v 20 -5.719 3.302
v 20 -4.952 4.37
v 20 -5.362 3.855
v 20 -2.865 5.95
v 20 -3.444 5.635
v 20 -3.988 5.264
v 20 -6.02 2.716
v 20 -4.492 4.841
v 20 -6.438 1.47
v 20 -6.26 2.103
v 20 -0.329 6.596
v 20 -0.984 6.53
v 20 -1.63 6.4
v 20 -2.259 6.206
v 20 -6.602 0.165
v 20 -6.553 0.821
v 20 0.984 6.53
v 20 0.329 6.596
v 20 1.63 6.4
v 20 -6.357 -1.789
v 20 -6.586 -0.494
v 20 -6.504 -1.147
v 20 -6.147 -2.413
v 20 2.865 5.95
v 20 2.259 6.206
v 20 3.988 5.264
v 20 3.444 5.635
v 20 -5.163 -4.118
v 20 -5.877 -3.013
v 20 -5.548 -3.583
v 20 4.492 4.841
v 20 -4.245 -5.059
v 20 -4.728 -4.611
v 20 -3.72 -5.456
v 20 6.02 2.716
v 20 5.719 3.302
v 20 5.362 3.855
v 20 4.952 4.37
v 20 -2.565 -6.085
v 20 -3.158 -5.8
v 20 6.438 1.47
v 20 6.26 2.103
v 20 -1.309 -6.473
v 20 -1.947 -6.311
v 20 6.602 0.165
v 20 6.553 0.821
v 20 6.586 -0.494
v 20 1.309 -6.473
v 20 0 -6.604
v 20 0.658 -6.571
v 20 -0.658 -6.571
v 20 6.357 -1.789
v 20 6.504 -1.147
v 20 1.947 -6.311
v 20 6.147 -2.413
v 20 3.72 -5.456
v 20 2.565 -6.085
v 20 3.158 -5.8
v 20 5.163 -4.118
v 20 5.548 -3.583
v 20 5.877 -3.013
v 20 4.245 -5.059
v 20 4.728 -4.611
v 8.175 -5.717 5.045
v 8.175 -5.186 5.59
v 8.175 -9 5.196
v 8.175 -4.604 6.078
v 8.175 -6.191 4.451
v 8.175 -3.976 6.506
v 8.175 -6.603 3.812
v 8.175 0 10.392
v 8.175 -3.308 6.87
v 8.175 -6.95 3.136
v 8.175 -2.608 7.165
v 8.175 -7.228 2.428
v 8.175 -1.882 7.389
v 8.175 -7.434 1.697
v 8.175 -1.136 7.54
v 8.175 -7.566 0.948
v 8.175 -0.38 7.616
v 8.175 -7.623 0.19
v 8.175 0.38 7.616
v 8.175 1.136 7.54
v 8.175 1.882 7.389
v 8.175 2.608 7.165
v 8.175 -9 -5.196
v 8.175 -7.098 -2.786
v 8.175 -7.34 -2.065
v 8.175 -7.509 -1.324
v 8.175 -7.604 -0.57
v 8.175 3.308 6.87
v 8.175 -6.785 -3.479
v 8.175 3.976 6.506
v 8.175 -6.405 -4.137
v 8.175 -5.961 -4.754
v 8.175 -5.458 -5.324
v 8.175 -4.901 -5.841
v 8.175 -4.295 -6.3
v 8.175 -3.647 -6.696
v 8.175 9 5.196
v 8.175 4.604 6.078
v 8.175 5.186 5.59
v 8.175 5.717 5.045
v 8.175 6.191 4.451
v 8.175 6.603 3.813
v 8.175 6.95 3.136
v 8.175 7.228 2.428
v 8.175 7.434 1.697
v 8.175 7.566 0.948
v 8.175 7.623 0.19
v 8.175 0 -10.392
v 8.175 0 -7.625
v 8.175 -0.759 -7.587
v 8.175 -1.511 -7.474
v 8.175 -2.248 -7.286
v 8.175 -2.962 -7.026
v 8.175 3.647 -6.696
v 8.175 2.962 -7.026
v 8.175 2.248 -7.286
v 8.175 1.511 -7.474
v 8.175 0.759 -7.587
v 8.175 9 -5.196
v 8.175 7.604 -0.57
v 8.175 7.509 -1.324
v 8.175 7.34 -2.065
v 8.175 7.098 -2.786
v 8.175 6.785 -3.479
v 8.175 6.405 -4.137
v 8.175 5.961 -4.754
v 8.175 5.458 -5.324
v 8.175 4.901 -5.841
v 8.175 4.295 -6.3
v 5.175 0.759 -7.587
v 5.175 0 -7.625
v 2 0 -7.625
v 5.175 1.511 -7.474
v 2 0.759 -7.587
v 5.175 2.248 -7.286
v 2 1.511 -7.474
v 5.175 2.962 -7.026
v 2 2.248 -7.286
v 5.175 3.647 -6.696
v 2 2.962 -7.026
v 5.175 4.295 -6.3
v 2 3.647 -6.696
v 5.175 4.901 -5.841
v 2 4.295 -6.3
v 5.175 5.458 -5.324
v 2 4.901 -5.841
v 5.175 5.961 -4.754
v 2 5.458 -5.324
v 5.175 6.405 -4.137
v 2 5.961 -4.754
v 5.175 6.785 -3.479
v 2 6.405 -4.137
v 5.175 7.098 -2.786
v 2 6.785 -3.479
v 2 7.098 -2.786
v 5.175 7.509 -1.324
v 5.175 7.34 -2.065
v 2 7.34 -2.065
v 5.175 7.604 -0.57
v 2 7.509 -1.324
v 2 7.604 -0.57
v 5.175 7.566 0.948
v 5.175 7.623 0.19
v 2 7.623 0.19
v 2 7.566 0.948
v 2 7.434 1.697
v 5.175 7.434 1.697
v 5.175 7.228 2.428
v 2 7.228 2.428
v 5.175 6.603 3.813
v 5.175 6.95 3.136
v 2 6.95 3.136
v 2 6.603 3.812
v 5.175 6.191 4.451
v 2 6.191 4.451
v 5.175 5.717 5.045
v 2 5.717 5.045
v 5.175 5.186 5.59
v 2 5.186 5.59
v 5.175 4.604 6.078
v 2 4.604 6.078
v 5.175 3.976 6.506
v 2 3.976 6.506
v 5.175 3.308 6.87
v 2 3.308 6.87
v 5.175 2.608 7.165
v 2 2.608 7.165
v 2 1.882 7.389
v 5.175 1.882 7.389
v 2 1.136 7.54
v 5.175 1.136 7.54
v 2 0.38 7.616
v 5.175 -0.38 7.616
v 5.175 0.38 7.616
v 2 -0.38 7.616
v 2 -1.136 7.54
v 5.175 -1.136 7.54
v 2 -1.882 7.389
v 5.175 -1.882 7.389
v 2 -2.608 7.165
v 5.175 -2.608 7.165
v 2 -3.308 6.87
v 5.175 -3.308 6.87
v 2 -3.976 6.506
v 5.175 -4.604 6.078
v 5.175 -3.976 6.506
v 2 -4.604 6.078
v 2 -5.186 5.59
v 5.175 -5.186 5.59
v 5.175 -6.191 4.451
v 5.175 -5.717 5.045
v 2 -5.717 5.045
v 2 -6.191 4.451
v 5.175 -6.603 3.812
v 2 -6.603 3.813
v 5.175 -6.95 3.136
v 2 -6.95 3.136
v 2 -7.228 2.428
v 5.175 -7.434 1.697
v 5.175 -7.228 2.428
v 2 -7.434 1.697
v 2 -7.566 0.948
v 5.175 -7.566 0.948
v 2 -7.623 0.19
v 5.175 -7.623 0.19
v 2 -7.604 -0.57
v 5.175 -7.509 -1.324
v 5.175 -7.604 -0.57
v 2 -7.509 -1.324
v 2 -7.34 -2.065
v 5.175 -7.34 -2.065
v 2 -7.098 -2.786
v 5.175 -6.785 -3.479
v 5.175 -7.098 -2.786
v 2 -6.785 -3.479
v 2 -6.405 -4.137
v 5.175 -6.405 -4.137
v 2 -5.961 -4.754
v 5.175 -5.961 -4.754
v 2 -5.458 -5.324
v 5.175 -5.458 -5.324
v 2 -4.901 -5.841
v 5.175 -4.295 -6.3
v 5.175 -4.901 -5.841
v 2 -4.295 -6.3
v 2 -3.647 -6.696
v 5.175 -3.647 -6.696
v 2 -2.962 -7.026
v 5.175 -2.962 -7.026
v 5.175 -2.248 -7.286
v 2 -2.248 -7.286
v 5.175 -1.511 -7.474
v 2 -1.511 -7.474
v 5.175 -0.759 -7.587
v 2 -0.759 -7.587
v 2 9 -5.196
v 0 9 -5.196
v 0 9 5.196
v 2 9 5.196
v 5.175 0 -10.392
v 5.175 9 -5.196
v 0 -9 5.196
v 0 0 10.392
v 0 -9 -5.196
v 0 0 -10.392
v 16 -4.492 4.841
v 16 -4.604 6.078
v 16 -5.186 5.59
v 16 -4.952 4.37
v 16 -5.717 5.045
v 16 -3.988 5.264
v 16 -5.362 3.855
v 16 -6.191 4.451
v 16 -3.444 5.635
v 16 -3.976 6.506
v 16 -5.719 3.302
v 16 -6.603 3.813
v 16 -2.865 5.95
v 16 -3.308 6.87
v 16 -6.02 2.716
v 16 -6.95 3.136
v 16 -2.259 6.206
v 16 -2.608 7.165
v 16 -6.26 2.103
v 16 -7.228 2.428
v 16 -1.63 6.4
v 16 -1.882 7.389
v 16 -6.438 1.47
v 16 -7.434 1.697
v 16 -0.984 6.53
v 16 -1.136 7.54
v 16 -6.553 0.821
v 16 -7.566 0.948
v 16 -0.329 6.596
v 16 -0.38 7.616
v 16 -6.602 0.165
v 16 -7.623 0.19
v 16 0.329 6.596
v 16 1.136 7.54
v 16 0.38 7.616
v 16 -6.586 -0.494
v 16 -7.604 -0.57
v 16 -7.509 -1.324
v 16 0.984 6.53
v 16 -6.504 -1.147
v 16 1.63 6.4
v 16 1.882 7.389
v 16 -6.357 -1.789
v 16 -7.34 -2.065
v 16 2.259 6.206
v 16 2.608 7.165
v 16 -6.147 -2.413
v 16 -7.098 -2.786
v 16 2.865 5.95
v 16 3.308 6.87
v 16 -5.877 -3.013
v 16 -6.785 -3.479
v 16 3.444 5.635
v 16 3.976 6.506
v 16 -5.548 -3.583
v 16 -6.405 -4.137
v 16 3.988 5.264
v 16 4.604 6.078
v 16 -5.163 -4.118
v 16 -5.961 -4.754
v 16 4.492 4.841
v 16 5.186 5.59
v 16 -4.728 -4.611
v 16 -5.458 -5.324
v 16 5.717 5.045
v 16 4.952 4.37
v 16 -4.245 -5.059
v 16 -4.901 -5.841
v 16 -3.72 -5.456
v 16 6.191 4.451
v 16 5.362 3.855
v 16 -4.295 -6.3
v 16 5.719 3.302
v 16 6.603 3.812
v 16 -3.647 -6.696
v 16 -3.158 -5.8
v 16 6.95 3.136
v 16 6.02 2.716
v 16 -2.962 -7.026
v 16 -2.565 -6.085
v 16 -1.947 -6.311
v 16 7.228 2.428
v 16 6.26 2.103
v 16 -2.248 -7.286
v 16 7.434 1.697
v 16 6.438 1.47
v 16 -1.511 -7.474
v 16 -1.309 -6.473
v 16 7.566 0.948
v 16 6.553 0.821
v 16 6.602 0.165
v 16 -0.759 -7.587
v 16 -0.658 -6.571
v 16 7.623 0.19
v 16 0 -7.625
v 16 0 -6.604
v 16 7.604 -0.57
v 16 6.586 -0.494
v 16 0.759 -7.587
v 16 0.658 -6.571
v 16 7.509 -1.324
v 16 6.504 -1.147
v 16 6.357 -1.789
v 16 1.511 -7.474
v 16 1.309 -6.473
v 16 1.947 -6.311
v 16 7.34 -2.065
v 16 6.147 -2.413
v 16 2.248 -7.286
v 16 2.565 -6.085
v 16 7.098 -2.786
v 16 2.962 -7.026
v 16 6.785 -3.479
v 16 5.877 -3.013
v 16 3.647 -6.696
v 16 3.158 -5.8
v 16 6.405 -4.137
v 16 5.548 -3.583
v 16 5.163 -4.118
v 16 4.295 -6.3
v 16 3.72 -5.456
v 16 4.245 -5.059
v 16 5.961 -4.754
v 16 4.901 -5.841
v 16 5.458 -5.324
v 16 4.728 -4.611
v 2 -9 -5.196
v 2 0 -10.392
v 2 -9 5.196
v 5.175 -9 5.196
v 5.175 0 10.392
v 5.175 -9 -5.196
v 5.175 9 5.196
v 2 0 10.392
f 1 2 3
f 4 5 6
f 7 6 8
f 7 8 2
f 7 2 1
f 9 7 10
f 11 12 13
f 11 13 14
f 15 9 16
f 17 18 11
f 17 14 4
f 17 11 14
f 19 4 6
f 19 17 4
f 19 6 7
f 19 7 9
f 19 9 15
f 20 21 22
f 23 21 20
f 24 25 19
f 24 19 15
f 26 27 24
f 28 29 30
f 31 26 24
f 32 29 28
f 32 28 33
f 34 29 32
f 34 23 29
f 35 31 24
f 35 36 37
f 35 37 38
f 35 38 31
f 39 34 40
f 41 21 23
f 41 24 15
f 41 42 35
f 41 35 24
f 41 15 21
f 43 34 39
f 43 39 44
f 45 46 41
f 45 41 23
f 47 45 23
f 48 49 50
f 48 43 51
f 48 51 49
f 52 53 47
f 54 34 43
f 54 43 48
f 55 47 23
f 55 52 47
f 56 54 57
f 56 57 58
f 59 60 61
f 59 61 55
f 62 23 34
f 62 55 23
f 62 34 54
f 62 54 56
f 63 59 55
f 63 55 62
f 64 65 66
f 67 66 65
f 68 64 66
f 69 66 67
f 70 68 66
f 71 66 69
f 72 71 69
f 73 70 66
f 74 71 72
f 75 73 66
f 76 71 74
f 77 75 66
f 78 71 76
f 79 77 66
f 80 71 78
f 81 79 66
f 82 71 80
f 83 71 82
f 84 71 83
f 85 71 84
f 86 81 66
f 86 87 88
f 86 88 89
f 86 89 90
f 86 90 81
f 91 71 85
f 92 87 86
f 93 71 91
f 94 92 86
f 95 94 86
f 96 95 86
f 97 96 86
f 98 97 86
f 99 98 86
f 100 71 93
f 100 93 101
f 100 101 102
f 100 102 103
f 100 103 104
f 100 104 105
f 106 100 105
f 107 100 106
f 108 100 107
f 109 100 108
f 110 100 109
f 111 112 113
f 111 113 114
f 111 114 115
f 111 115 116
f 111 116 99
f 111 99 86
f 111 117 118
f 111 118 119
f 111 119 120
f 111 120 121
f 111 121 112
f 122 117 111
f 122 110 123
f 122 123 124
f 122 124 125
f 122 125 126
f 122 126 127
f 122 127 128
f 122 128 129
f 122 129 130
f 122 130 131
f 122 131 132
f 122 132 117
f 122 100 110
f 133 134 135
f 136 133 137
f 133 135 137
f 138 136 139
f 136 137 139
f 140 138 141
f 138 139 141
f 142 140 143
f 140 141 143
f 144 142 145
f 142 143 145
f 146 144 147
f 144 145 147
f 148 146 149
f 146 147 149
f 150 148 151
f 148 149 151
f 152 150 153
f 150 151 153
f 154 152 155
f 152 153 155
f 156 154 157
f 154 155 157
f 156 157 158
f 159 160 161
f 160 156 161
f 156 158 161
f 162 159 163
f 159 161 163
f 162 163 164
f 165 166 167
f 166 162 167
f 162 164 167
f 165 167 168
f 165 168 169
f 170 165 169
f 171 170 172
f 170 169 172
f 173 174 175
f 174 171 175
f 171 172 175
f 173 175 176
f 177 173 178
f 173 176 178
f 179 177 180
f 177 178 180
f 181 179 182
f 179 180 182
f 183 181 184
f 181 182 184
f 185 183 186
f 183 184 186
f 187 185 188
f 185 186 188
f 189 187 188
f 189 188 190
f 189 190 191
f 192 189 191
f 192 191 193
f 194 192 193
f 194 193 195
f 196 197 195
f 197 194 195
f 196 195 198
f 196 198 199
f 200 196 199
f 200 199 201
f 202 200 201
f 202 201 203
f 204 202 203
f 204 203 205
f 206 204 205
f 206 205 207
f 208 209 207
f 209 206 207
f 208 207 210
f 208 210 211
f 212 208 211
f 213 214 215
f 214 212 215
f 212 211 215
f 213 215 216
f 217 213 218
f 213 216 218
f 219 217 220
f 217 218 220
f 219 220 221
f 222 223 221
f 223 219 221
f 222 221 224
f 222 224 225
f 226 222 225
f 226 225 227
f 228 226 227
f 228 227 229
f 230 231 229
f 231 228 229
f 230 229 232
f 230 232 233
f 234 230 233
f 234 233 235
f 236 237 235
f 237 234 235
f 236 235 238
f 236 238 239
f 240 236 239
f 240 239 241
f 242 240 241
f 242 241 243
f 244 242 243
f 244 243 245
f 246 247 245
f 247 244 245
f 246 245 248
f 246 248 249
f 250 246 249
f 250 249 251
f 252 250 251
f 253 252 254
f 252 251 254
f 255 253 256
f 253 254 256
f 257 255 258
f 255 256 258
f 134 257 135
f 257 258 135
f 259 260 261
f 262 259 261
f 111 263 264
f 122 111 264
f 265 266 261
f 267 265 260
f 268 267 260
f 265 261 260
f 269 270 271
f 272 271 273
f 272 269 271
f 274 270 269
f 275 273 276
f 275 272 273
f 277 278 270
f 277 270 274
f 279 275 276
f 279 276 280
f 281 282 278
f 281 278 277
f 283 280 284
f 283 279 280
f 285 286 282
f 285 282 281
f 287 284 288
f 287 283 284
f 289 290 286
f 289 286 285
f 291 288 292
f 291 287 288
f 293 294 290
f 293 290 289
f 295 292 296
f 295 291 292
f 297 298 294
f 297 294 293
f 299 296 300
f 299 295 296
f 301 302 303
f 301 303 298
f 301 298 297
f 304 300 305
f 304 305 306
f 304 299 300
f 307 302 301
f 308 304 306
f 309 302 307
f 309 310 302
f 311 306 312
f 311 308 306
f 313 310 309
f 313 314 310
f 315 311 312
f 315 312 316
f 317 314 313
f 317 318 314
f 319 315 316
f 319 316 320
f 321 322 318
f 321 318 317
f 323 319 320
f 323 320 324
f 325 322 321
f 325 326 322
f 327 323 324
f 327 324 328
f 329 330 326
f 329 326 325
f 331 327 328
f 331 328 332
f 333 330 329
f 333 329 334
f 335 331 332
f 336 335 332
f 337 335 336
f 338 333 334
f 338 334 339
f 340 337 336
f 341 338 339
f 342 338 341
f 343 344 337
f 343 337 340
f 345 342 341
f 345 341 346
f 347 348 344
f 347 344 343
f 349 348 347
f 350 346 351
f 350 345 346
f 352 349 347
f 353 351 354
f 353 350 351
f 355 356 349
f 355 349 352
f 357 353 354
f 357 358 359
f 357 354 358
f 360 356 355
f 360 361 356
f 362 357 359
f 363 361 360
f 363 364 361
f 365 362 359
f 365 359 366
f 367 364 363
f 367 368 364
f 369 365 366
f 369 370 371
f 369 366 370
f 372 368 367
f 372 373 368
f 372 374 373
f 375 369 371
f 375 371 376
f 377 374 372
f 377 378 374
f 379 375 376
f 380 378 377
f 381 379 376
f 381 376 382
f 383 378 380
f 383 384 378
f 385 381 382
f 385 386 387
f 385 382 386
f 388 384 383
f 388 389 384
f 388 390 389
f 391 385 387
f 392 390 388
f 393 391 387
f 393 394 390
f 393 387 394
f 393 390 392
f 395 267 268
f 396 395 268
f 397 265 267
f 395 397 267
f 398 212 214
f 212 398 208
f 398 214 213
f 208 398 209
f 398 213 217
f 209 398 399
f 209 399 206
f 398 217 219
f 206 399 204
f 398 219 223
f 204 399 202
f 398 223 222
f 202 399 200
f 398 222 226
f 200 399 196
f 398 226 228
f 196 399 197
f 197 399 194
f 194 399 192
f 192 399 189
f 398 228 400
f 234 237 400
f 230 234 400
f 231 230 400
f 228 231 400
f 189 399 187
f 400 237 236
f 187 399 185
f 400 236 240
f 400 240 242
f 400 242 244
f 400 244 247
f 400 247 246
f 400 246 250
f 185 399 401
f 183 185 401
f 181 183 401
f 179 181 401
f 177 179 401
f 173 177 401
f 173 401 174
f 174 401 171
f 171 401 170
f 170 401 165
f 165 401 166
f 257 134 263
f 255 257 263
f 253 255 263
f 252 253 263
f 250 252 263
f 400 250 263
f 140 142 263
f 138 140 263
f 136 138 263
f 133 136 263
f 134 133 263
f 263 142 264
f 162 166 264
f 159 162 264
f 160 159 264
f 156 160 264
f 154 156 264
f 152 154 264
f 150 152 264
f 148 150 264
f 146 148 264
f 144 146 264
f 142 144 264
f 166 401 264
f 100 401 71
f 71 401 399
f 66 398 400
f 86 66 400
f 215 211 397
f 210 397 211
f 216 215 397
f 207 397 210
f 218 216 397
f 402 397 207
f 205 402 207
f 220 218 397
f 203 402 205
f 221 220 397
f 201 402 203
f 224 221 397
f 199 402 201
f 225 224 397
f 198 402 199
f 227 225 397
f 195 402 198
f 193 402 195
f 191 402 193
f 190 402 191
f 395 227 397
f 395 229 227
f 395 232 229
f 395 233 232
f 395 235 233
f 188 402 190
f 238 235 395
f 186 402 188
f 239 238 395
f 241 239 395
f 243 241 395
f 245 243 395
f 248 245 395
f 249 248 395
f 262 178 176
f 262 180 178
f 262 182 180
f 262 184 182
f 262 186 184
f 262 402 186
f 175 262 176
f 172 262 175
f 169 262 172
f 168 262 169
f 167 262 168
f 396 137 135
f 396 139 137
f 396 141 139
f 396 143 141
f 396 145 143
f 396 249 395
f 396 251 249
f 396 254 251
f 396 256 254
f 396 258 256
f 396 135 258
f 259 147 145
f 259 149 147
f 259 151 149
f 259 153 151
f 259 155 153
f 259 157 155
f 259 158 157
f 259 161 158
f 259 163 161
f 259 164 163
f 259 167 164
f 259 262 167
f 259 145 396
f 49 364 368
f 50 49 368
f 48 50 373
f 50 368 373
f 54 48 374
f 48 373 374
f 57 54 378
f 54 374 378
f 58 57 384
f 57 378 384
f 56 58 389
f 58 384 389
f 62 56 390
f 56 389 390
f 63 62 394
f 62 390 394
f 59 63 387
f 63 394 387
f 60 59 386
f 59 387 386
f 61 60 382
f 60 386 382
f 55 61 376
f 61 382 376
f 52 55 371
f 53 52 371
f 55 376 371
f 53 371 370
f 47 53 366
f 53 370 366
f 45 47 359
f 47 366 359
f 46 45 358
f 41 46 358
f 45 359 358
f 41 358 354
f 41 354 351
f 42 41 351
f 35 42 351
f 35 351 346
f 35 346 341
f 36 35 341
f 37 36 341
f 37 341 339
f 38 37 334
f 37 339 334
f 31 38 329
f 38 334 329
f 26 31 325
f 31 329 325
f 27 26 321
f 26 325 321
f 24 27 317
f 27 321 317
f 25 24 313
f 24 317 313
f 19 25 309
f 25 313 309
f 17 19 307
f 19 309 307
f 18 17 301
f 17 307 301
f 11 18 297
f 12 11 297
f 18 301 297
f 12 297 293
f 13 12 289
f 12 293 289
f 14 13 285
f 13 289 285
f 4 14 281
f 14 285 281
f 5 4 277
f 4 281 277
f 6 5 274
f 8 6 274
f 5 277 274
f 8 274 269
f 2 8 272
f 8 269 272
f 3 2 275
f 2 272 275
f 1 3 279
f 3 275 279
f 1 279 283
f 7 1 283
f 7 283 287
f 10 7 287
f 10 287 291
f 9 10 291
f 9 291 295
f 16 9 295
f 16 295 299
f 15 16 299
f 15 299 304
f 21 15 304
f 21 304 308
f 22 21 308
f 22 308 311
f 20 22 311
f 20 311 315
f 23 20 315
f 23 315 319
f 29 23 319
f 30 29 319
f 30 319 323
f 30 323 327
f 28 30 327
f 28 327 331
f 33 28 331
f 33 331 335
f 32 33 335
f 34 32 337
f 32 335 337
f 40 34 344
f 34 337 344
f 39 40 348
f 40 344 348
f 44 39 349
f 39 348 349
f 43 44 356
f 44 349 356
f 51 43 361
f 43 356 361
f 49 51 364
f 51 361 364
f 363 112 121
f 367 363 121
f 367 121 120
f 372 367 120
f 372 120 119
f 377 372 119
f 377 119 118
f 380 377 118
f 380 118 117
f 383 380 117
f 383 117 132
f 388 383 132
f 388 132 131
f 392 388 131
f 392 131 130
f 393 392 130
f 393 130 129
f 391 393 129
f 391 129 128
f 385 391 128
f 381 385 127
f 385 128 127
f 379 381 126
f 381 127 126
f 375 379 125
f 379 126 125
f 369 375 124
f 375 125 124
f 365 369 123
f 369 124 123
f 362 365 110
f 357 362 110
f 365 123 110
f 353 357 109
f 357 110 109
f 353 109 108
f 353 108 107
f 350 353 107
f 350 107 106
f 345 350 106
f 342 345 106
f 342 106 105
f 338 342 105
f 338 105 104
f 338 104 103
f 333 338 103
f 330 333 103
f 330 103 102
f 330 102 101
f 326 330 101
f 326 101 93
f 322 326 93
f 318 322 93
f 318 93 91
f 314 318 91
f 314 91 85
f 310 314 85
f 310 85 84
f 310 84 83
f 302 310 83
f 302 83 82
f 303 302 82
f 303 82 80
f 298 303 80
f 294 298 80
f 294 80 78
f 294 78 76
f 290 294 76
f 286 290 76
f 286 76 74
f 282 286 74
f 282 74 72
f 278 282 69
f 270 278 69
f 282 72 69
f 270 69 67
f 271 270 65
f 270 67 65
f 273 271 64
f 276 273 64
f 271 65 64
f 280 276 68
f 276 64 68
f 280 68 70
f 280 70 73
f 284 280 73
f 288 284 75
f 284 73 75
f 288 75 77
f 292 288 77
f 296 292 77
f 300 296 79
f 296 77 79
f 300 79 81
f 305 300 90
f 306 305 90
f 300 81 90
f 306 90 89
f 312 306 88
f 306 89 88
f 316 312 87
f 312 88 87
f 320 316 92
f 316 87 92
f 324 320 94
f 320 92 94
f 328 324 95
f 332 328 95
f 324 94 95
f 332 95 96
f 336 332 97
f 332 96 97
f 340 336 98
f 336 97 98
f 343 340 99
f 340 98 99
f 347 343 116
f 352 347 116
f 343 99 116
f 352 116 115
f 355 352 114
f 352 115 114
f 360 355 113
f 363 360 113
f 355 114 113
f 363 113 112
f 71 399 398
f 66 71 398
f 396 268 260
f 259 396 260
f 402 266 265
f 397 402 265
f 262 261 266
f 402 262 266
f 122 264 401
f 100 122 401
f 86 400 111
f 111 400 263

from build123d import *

# Parameters (mm, degrees)
BOSS_EXTRUDE1_DEPTH = 2
SKETCH2_R           = 7.625
BOSS_EXTRUDE2_DEPTH = 14
SKETCH3_R           = 6.604
BOSS_EXTRUDE3_DEPTH = 4
BOSS_EXTRUDE4_START = 3.175
BOSS_EXTRUDE4_DEPTH = 3


with BuildPart() as part:
    # Sketch1 → Boss-Extrude1 (new body)
    with BuildSketch(Plane(origin=(0, 0, 0), x_dir=(0, 0, -1), z_dir=(1, 0, 0))):
        Polygon((5.196152442, 9.000000034), (-5.196152442, 9.000000034), (-10.392304885, 0), (-5.196152442, -9.000000034), (5.196152442, -9.000000034), (10.392304885, 0), align=None)
    extrude(amount=BOSS_EXTRUDE1_DEPTH)

    # Sketch2 → Boss-Extrude2 (add)
    with BuildSketch(Plane(origin=(2, 0, 0), x_dir=(0, 0, -1), z_dir=(1, 0, 0))):
        Circle(SKETCH2_R)
    extrude(amount=BOSS_EXTRUDE2_DEPTH)

    # Sketch3 → Boss-Extrude3 (add)
    with BuildSketch(Plane(origin=(16, 0, 0), x_dir=(0, 0, -1), z_dir=(1, 0, 0))):
        Circle(SKETCH3_R)
    extrude(amount=BOSS_EXTRUDE3_DEPTH)

    # Sketch4 → Boss-Extrude4 (add)
    with BuildSketch(Plane(origin=(2, 0, 0), x_dir=(0, 0, -1), z_dir=(1, 0, 0)).offset(BOSS_EXTRUDE4_START)):
        Polygon((10.392304885, 0), (5.196152442, 9.000000034), (-5.196152442, 9.000000034), (-10.392304885, 0), (-5.196152442, -9.000000034), (5.196152442, -9.000000034), align=None)
    extrude(amount=BOSS_EXTRUDE4_DEPTH)


solid = part.part
